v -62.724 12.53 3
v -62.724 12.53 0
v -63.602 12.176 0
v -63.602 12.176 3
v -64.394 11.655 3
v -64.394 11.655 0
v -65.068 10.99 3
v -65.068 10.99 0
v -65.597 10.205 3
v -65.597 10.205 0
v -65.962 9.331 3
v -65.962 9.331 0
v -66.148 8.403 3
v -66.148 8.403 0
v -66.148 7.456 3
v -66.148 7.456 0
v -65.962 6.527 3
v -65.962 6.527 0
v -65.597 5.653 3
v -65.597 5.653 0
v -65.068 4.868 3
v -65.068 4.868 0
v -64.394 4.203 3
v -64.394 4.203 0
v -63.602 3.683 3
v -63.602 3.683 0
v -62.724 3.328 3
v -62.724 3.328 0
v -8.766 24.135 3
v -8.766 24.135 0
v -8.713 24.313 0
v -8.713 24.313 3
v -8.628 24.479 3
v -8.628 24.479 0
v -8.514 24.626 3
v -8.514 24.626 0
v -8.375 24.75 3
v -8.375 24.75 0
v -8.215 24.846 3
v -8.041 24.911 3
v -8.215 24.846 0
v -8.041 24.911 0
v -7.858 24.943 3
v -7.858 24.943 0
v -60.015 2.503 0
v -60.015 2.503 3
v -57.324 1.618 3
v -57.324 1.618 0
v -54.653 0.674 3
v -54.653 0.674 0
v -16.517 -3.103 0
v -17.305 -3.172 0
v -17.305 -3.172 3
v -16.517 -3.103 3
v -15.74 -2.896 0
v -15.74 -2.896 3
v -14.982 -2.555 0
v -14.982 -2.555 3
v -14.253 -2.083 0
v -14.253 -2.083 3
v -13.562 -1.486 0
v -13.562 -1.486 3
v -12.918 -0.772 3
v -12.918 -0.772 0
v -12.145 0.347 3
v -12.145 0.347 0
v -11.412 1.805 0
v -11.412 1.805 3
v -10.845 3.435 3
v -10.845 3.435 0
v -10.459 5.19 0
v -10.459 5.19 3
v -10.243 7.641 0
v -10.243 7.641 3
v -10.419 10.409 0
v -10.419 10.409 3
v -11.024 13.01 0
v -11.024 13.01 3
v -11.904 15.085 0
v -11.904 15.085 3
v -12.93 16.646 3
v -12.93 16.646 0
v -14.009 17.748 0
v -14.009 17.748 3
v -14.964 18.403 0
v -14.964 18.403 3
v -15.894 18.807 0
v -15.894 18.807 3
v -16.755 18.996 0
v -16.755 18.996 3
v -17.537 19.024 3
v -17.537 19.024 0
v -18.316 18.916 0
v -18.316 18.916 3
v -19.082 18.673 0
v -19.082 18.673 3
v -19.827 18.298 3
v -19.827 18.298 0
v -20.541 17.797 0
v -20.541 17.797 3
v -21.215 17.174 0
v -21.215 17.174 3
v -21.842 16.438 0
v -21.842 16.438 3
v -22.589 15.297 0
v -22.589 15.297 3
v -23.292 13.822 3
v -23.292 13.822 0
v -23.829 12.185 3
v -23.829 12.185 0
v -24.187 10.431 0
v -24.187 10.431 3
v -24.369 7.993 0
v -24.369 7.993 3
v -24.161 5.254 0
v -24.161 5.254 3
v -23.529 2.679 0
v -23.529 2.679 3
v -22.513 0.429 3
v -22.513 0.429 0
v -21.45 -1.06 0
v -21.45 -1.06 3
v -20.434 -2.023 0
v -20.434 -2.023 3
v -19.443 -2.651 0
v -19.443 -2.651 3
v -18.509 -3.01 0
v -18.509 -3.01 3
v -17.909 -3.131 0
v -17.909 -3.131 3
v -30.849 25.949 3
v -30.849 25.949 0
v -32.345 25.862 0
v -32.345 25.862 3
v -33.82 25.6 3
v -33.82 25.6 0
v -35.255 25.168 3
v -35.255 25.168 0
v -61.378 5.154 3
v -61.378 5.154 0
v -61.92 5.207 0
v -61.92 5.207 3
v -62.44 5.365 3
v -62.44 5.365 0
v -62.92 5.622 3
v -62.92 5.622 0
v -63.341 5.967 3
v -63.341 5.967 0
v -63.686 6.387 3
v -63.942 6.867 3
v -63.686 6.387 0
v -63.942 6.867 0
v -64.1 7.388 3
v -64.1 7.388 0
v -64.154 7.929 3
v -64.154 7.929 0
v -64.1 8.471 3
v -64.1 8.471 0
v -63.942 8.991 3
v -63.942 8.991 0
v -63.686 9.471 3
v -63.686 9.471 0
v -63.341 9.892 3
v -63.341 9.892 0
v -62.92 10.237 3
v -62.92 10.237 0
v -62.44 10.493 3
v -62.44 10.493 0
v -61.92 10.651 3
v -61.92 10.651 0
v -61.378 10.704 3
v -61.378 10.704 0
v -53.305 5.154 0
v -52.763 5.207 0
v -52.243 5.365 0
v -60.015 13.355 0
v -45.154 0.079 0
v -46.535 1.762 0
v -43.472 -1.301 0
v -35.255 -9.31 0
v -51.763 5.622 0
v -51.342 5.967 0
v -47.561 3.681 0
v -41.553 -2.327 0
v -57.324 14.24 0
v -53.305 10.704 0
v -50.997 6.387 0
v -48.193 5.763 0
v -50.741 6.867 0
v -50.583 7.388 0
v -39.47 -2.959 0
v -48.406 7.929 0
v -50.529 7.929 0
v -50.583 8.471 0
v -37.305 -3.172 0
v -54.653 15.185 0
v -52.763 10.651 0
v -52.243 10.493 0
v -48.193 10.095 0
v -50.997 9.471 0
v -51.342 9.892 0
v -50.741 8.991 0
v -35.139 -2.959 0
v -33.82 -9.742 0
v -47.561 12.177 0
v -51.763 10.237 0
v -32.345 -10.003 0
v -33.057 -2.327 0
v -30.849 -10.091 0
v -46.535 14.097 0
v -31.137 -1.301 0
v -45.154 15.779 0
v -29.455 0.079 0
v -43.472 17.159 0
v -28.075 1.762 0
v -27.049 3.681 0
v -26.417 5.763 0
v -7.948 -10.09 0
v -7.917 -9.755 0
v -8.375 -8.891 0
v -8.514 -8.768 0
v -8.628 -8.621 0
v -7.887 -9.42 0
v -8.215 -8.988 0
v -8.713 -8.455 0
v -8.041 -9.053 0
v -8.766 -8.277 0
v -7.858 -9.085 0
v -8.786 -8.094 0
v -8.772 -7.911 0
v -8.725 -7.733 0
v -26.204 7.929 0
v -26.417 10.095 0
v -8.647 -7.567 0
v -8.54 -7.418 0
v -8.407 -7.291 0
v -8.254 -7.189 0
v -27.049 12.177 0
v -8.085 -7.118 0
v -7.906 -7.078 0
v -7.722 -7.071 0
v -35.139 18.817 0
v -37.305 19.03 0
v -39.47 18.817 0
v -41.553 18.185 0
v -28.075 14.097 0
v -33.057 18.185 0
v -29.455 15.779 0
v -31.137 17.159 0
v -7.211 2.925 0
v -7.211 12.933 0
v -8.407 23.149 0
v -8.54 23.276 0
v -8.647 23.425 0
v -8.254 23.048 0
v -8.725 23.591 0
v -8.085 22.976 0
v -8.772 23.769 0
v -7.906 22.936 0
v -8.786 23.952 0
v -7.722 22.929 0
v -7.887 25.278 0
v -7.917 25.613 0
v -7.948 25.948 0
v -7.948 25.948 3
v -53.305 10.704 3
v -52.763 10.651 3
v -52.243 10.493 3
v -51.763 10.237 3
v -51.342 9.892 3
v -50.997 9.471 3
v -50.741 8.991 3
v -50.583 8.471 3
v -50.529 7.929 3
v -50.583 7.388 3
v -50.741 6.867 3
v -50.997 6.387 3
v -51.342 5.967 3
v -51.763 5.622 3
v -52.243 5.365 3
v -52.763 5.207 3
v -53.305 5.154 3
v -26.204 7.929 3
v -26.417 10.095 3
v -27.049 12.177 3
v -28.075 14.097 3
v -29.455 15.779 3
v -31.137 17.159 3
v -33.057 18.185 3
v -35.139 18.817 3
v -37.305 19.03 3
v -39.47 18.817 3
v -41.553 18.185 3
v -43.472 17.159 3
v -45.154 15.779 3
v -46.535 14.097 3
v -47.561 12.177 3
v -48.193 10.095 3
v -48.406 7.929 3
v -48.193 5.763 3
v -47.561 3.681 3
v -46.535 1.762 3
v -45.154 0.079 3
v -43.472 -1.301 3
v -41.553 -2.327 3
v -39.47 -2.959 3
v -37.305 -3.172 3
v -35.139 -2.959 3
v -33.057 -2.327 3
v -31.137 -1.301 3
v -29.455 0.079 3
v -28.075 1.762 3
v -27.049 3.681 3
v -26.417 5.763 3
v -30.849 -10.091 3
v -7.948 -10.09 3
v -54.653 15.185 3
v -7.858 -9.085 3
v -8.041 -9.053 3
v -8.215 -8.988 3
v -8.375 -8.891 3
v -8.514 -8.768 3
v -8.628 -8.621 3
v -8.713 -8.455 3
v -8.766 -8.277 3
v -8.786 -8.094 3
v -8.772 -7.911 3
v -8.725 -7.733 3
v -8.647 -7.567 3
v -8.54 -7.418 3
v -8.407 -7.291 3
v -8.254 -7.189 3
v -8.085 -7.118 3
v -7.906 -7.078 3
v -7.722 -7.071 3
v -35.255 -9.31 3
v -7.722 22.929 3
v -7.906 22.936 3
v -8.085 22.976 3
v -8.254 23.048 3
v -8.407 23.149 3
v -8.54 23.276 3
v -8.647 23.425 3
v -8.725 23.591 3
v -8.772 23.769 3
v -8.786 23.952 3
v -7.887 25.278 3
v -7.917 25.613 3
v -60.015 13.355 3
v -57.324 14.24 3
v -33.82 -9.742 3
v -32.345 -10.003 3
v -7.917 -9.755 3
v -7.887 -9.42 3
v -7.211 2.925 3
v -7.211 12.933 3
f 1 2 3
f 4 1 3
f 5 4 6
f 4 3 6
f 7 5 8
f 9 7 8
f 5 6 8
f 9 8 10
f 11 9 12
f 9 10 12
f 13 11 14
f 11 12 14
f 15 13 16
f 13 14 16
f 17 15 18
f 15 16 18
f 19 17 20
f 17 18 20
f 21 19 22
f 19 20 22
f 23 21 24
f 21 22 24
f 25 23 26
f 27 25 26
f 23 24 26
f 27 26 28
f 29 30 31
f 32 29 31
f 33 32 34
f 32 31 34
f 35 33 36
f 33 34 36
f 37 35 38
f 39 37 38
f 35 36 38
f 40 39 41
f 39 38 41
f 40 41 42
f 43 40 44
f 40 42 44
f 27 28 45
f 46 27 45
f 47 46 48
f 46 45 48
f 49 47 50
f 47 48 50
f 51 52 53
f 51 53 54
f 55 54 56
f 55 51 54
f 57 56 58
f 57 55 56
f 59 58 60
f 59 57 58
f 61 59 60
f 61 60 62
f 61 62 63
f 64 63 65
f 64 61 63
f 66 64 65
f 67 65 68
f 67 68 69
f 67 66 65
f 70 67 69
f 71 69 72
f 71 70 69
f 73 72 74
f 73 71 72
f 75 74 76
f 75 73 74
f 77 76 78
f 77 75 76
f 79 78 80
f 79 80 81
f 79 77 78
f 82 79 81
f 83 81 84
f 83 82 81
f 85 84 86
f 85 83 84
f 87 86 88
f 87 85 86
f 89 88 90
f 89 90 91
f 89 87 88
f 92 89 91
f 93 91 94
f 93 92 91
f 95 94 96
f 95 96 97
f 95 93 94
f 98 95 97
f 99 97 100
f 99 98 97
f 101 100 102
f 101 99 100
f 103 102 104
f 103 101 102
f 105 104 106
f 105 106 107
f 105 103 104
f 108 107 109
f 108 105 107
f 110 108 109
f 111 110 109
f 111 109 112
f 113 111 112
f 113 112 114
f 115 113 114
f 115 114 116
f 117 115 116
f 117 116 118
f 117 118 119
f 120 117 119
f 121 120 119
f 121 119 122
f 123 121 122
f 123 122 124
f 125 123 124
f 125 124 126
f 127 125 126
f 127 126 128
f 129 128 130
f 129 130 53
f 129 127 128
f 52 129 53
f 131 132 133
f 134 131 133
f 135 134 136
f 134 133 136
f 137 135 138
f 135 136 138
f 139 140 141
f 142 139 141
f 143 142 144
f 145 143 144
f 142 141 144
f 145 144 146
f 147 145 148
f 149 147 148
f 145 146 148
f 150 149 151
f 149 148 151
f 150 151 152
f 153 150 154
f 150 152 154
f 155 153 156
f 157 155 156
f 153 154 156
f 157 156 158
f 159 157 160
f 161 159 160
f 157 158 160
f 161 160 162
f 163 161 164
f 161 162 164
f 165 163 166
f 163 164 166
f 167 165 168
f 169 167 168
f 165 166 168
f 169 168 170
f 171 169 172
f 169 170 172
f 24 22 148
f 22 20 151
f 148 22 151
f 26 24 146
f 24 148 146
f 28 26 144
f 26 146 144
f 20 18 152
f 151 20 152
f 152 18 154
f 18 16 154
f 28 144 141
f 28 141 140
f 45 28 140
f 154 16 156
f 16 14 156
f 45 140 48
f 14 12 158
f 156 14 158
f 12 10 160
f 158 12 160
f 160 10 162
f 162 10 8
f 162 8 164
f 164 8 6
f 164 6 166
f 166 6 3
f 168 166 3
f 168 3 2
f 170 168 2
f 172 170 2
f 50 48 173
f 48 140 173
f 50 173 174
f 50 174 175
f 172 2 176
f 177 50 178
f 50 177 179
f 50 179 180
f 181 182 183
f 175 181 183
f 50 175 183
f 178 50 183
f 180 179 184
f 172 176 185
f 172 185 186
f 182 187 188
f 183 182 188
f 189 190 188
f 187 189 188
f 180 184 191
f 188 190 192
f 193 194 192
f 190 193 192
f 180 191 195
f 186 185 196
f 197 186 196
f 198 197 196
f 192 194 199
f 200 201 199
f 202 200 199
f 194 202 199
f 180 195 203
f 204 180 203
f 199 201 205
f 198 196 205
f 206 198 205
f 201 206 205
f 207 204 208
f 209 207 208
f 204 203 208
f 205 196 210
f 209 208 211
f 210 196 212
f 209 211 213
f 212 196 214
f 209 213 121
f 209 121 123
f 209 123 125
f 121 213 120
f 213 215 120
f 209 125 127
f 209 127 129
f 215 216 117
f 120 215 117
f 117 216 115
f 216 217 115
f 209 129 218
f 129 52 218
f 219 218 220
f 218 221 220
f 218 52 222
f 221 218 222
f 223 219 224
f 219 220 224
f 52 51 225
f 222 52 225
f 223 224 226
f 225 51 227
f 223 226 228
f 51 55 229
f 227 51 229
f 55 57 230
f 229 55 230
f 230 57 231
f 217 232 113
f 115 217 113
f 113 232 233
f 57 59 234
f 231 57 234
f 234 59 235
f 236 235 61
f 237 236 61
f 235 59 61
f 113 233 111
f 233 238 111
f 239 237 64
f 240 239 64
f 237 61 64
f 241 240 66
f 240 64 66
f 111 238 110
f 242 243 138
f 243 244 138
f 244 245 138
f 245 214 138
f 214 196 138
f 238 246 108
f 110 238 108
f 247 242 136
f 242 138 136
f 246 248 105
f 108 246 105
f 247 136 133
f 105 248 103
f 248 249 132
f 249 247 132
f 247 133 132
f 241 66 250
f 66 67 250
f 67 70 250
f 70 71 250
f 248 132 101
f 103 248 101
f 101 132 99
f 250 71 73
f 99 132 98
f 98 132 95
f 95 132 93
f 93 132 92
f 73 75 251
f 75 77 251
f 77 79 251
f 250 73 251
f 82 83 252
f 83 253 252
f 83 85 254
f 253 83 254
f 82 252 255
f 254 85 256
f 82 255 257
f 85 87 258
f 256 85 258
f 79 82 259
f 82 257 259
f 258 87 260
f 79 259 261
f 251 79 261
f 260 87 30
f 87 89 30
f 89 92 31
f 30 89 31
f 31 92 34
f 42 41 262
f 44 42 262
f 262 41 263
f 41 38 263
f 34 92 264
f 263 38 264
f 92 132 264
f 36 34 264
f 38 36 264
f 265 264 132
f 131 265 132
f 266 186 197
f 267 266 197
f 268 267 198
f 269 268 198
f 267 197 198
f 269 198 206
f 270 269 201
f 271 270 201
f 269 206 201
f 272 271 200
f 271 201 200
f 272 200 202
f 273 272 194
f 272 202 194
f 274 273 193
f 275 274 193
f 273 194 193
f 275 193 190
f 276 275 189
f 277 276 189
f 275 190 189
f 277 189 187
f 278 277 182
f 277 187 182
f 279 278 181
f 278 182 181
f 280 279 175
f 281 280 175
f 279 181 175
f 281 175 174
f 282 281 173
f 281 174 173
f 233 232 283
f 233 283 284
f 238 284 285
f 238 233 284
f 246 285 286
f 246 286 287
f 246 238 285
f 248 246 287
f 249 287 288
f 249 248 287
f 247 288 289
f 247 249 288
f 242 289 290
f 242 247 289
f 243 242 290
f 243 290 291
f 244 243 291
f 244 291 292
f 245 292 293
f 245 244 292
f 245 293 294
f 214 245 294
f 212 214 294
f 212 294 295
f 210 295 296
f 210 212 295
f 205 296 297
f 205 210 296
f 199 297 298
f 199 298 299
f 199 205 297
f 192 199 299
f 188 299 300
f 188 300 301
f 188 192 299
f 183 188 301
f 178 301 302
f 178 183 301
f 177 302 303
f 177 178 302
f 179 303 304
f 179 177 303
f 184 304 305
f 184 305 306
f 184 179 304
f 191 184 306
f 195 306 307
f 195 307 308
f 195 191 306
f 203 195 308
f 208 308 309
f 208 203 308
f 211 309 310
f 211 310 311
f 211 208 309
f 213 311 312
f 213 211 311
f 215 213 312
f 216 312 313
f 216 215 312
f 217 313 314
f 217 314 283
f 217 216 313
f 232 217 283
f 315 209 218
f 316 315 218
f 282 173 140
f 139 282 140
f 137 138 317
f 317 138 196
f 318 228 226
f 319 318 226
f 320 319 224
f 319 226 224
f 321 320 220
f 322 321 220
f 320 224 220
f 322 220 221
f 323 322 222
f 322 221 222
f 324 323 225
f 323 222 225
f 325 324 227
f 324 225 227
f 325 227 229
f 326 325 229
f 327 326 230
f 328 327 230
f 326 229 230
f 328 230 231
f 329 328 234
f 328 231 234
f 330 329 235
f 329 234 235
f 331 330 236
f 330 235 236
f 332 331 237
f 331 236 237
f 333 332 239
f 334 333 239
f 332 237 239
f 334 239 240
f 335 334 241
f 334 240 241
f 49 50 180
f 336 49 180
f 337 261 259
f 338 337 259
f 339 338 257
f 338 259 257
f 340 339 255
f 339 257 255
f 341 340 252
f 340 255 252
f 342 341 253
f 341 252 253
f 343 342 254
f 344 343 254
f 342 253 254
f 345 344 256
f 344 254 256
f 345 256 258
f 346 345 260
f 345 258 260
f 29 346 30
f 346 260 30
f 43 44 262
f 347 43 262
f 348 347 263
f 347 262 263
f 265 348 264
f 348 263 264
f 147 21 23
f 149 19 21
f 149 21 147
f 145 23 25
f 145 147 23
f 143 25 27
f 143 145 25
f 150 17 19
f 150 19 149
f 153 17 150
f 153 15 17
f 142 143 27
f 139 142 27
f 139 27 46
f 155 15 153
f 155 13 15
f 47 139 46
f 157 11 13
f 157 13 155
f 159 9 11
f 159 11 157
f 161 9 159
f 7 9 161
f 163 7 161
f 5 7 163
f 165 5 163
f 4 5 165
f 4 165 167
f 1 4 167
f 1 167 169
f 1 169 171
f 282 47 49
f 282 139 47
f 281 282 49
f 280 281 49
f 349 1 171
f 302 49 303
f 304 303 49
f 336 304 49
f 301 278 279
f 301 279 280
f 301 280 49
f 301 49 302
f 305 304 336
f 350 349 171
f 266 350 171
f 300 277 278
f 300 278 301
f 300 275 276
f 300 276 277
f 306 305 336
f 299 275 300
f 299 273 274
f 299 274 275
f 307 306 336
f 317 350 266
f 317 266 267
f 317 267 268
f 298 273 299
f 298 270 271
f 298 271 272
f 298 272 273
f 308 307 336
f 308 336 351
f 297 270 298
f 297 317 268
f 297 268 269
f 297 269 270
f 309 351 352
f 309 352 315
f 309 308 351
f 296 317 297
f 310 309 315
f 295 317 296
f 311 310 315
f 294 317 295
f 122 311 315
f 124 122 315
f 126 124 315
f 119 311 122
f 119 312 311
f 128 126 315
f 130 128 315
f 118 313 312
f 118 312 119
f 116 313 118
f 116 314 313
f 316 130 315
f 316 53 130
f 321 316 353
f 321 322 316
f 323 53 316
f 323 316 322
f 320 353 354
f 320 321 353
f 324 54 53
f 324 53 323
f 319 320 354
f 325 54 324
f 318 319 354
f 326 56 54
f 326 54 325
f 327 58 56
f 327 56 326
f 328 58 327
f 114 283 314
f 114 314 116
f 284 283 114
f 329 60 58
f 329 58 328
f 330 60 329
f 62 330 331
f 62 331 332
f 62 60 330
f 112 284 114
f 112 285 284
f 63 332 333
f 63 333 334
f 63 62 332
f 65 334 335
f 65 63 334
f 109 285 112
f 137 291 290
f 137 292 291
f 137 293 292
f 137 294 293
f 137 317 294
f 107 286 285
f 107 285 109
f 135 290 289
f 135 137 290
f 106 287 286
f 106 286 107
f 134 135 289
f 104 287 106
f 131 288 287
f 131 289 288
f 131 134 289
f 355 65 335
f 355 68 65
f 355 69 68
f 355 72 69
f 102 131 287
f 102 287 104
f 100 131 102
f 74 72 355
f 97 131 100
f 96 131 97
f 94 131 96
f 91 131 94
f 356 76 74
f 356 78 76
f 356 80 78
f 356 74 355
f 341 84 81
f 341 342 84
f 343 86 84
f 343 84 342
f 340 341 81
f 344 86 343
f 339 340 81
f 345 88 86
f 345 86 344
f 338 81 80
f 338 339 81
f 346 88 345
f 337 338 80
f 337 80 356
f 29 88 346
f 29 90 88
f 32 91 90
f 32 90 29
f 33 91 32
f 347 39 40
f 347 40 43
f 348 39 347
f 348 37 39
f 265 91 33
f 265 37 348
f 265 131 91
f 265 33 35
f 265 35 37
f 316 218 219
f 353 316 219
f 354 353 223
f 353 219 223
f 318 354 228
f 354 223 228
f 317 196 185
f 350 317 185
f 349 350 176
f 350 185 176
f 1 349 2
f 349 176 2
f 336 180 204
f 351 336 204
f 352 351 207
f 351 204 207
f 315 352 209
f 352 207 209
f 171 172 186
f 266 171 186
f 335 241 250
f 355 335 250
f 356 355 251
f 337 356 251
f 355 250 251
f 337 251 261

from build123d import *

# Parameters (mm, degrees)
SKETCH1_R           = 11.1010859
SKETCH1_RX          = 11.1010859
SKETCH1_RY          = 7.064327391
BOSS_EXTRUDE1_DEPTH = 3


with BuildPart() as part:
    # Sketch1 → Boss-Extrude1 (new body)
    with BuildSketch(Plane.XY):
        with BuildLine():
            Line((-7.947748781, 25.947914006), (-30.848746588, 25.949129975))
            ThreePointArc((-30.848746588, 25.949129975), (-33.08604518, 25.75234666), (-35.254642351, 25.168039404))
            Line((-35.254642351, 25.168039404), (-54.653402891, 15.184517643))
            ThreePointArc((-54.653402891, 15.184517643), (-58.666824966, 13.790309954), (-62.724252982, 12.529893468))
            ThreePointArc((-62.724252982, 12.529893468), (-66.171891815, 7.929095788), (-62.724252982, 3.328298109))
            ThreePointArc((-62.724252982, 3.328298109), (-58.666824966, 2.067881622), (-54.653402891, 0.673673934))
            Line((-54.653402891, 0.673673934), (-35.254642351, -9.309847827))
            ThreePointArc((-35.254642351, -9.309847827), (-33.08604518, -9.894155084), (-30.848746588, -10.090938398))
            Line((-30.848746588, -10.090938398), (-7.947748781, -10.08972243))
            ThreePointArc((-7.947748781, -10.08972243), (-7.901977934, -9.587204007), (-7.857501769, -9.084569342))
            ThreePointArc((-7.857501769, -9.084569342), (-8.447347212, -8.832838784), (-8.766415179, -8.276528123))
            ThreePointArc((-8.766415179, -8.276528123), (-8.539635898, -7.417867221), (-7.722112775, -7.070904212))
            ThreePointArc((-7.722112775, -7.070904212), (-7.146843313, 7.929095788), (-7.722112775, 22.929095788))
            ThreePointArc((-7.722112775, 22.929095788), (-8.539635898, 23.276058798), (-8.766415179, 24.134719699))
            ThreePointArc((-8.766415179, 24.134719699), (-8.447347212, 24.691030361), (-7.857501769, 24.942760918))
            ThreePointArc((-7.857501769, 24.942760918), (-7.901977934, 25.445395584), (-7.947748781, 25.947914006))
        make_face()
        with Locations((-37.304724068, 7.929095788)):
            Circle(SKETCH1_R, mode=Mode.SUBTRACT)
        with Locations(Location((-17.304724068, 7.929095788), (0, 0, -90))):
            Ellipse(SKETCH1_RX, SKETCH1_RY, mode=Mode.SUBTRACT)
        with BuildLine():
            Line((-61.378241086, 10.704367263), (-53.304724068, 10.704367263))
            ThreePointArc((-53.304724068, 10.704367263), (-50.529452593, 7.929095788), (-53.304724068, 5.153824313))
            Line((-53.304724068, 5.153824313), (-61.378241086, 5.153824313))
            ThreePointArc((-61.378241086, 5.153824313), (-64.153512561, 7.929095788), (-61.378241086, 10.704367263))
        make_face(mode=Mode.SUBTRACT)
    extrude(amount=BOSS_EXTRUDE1_DEPTH)


solid = part.part
